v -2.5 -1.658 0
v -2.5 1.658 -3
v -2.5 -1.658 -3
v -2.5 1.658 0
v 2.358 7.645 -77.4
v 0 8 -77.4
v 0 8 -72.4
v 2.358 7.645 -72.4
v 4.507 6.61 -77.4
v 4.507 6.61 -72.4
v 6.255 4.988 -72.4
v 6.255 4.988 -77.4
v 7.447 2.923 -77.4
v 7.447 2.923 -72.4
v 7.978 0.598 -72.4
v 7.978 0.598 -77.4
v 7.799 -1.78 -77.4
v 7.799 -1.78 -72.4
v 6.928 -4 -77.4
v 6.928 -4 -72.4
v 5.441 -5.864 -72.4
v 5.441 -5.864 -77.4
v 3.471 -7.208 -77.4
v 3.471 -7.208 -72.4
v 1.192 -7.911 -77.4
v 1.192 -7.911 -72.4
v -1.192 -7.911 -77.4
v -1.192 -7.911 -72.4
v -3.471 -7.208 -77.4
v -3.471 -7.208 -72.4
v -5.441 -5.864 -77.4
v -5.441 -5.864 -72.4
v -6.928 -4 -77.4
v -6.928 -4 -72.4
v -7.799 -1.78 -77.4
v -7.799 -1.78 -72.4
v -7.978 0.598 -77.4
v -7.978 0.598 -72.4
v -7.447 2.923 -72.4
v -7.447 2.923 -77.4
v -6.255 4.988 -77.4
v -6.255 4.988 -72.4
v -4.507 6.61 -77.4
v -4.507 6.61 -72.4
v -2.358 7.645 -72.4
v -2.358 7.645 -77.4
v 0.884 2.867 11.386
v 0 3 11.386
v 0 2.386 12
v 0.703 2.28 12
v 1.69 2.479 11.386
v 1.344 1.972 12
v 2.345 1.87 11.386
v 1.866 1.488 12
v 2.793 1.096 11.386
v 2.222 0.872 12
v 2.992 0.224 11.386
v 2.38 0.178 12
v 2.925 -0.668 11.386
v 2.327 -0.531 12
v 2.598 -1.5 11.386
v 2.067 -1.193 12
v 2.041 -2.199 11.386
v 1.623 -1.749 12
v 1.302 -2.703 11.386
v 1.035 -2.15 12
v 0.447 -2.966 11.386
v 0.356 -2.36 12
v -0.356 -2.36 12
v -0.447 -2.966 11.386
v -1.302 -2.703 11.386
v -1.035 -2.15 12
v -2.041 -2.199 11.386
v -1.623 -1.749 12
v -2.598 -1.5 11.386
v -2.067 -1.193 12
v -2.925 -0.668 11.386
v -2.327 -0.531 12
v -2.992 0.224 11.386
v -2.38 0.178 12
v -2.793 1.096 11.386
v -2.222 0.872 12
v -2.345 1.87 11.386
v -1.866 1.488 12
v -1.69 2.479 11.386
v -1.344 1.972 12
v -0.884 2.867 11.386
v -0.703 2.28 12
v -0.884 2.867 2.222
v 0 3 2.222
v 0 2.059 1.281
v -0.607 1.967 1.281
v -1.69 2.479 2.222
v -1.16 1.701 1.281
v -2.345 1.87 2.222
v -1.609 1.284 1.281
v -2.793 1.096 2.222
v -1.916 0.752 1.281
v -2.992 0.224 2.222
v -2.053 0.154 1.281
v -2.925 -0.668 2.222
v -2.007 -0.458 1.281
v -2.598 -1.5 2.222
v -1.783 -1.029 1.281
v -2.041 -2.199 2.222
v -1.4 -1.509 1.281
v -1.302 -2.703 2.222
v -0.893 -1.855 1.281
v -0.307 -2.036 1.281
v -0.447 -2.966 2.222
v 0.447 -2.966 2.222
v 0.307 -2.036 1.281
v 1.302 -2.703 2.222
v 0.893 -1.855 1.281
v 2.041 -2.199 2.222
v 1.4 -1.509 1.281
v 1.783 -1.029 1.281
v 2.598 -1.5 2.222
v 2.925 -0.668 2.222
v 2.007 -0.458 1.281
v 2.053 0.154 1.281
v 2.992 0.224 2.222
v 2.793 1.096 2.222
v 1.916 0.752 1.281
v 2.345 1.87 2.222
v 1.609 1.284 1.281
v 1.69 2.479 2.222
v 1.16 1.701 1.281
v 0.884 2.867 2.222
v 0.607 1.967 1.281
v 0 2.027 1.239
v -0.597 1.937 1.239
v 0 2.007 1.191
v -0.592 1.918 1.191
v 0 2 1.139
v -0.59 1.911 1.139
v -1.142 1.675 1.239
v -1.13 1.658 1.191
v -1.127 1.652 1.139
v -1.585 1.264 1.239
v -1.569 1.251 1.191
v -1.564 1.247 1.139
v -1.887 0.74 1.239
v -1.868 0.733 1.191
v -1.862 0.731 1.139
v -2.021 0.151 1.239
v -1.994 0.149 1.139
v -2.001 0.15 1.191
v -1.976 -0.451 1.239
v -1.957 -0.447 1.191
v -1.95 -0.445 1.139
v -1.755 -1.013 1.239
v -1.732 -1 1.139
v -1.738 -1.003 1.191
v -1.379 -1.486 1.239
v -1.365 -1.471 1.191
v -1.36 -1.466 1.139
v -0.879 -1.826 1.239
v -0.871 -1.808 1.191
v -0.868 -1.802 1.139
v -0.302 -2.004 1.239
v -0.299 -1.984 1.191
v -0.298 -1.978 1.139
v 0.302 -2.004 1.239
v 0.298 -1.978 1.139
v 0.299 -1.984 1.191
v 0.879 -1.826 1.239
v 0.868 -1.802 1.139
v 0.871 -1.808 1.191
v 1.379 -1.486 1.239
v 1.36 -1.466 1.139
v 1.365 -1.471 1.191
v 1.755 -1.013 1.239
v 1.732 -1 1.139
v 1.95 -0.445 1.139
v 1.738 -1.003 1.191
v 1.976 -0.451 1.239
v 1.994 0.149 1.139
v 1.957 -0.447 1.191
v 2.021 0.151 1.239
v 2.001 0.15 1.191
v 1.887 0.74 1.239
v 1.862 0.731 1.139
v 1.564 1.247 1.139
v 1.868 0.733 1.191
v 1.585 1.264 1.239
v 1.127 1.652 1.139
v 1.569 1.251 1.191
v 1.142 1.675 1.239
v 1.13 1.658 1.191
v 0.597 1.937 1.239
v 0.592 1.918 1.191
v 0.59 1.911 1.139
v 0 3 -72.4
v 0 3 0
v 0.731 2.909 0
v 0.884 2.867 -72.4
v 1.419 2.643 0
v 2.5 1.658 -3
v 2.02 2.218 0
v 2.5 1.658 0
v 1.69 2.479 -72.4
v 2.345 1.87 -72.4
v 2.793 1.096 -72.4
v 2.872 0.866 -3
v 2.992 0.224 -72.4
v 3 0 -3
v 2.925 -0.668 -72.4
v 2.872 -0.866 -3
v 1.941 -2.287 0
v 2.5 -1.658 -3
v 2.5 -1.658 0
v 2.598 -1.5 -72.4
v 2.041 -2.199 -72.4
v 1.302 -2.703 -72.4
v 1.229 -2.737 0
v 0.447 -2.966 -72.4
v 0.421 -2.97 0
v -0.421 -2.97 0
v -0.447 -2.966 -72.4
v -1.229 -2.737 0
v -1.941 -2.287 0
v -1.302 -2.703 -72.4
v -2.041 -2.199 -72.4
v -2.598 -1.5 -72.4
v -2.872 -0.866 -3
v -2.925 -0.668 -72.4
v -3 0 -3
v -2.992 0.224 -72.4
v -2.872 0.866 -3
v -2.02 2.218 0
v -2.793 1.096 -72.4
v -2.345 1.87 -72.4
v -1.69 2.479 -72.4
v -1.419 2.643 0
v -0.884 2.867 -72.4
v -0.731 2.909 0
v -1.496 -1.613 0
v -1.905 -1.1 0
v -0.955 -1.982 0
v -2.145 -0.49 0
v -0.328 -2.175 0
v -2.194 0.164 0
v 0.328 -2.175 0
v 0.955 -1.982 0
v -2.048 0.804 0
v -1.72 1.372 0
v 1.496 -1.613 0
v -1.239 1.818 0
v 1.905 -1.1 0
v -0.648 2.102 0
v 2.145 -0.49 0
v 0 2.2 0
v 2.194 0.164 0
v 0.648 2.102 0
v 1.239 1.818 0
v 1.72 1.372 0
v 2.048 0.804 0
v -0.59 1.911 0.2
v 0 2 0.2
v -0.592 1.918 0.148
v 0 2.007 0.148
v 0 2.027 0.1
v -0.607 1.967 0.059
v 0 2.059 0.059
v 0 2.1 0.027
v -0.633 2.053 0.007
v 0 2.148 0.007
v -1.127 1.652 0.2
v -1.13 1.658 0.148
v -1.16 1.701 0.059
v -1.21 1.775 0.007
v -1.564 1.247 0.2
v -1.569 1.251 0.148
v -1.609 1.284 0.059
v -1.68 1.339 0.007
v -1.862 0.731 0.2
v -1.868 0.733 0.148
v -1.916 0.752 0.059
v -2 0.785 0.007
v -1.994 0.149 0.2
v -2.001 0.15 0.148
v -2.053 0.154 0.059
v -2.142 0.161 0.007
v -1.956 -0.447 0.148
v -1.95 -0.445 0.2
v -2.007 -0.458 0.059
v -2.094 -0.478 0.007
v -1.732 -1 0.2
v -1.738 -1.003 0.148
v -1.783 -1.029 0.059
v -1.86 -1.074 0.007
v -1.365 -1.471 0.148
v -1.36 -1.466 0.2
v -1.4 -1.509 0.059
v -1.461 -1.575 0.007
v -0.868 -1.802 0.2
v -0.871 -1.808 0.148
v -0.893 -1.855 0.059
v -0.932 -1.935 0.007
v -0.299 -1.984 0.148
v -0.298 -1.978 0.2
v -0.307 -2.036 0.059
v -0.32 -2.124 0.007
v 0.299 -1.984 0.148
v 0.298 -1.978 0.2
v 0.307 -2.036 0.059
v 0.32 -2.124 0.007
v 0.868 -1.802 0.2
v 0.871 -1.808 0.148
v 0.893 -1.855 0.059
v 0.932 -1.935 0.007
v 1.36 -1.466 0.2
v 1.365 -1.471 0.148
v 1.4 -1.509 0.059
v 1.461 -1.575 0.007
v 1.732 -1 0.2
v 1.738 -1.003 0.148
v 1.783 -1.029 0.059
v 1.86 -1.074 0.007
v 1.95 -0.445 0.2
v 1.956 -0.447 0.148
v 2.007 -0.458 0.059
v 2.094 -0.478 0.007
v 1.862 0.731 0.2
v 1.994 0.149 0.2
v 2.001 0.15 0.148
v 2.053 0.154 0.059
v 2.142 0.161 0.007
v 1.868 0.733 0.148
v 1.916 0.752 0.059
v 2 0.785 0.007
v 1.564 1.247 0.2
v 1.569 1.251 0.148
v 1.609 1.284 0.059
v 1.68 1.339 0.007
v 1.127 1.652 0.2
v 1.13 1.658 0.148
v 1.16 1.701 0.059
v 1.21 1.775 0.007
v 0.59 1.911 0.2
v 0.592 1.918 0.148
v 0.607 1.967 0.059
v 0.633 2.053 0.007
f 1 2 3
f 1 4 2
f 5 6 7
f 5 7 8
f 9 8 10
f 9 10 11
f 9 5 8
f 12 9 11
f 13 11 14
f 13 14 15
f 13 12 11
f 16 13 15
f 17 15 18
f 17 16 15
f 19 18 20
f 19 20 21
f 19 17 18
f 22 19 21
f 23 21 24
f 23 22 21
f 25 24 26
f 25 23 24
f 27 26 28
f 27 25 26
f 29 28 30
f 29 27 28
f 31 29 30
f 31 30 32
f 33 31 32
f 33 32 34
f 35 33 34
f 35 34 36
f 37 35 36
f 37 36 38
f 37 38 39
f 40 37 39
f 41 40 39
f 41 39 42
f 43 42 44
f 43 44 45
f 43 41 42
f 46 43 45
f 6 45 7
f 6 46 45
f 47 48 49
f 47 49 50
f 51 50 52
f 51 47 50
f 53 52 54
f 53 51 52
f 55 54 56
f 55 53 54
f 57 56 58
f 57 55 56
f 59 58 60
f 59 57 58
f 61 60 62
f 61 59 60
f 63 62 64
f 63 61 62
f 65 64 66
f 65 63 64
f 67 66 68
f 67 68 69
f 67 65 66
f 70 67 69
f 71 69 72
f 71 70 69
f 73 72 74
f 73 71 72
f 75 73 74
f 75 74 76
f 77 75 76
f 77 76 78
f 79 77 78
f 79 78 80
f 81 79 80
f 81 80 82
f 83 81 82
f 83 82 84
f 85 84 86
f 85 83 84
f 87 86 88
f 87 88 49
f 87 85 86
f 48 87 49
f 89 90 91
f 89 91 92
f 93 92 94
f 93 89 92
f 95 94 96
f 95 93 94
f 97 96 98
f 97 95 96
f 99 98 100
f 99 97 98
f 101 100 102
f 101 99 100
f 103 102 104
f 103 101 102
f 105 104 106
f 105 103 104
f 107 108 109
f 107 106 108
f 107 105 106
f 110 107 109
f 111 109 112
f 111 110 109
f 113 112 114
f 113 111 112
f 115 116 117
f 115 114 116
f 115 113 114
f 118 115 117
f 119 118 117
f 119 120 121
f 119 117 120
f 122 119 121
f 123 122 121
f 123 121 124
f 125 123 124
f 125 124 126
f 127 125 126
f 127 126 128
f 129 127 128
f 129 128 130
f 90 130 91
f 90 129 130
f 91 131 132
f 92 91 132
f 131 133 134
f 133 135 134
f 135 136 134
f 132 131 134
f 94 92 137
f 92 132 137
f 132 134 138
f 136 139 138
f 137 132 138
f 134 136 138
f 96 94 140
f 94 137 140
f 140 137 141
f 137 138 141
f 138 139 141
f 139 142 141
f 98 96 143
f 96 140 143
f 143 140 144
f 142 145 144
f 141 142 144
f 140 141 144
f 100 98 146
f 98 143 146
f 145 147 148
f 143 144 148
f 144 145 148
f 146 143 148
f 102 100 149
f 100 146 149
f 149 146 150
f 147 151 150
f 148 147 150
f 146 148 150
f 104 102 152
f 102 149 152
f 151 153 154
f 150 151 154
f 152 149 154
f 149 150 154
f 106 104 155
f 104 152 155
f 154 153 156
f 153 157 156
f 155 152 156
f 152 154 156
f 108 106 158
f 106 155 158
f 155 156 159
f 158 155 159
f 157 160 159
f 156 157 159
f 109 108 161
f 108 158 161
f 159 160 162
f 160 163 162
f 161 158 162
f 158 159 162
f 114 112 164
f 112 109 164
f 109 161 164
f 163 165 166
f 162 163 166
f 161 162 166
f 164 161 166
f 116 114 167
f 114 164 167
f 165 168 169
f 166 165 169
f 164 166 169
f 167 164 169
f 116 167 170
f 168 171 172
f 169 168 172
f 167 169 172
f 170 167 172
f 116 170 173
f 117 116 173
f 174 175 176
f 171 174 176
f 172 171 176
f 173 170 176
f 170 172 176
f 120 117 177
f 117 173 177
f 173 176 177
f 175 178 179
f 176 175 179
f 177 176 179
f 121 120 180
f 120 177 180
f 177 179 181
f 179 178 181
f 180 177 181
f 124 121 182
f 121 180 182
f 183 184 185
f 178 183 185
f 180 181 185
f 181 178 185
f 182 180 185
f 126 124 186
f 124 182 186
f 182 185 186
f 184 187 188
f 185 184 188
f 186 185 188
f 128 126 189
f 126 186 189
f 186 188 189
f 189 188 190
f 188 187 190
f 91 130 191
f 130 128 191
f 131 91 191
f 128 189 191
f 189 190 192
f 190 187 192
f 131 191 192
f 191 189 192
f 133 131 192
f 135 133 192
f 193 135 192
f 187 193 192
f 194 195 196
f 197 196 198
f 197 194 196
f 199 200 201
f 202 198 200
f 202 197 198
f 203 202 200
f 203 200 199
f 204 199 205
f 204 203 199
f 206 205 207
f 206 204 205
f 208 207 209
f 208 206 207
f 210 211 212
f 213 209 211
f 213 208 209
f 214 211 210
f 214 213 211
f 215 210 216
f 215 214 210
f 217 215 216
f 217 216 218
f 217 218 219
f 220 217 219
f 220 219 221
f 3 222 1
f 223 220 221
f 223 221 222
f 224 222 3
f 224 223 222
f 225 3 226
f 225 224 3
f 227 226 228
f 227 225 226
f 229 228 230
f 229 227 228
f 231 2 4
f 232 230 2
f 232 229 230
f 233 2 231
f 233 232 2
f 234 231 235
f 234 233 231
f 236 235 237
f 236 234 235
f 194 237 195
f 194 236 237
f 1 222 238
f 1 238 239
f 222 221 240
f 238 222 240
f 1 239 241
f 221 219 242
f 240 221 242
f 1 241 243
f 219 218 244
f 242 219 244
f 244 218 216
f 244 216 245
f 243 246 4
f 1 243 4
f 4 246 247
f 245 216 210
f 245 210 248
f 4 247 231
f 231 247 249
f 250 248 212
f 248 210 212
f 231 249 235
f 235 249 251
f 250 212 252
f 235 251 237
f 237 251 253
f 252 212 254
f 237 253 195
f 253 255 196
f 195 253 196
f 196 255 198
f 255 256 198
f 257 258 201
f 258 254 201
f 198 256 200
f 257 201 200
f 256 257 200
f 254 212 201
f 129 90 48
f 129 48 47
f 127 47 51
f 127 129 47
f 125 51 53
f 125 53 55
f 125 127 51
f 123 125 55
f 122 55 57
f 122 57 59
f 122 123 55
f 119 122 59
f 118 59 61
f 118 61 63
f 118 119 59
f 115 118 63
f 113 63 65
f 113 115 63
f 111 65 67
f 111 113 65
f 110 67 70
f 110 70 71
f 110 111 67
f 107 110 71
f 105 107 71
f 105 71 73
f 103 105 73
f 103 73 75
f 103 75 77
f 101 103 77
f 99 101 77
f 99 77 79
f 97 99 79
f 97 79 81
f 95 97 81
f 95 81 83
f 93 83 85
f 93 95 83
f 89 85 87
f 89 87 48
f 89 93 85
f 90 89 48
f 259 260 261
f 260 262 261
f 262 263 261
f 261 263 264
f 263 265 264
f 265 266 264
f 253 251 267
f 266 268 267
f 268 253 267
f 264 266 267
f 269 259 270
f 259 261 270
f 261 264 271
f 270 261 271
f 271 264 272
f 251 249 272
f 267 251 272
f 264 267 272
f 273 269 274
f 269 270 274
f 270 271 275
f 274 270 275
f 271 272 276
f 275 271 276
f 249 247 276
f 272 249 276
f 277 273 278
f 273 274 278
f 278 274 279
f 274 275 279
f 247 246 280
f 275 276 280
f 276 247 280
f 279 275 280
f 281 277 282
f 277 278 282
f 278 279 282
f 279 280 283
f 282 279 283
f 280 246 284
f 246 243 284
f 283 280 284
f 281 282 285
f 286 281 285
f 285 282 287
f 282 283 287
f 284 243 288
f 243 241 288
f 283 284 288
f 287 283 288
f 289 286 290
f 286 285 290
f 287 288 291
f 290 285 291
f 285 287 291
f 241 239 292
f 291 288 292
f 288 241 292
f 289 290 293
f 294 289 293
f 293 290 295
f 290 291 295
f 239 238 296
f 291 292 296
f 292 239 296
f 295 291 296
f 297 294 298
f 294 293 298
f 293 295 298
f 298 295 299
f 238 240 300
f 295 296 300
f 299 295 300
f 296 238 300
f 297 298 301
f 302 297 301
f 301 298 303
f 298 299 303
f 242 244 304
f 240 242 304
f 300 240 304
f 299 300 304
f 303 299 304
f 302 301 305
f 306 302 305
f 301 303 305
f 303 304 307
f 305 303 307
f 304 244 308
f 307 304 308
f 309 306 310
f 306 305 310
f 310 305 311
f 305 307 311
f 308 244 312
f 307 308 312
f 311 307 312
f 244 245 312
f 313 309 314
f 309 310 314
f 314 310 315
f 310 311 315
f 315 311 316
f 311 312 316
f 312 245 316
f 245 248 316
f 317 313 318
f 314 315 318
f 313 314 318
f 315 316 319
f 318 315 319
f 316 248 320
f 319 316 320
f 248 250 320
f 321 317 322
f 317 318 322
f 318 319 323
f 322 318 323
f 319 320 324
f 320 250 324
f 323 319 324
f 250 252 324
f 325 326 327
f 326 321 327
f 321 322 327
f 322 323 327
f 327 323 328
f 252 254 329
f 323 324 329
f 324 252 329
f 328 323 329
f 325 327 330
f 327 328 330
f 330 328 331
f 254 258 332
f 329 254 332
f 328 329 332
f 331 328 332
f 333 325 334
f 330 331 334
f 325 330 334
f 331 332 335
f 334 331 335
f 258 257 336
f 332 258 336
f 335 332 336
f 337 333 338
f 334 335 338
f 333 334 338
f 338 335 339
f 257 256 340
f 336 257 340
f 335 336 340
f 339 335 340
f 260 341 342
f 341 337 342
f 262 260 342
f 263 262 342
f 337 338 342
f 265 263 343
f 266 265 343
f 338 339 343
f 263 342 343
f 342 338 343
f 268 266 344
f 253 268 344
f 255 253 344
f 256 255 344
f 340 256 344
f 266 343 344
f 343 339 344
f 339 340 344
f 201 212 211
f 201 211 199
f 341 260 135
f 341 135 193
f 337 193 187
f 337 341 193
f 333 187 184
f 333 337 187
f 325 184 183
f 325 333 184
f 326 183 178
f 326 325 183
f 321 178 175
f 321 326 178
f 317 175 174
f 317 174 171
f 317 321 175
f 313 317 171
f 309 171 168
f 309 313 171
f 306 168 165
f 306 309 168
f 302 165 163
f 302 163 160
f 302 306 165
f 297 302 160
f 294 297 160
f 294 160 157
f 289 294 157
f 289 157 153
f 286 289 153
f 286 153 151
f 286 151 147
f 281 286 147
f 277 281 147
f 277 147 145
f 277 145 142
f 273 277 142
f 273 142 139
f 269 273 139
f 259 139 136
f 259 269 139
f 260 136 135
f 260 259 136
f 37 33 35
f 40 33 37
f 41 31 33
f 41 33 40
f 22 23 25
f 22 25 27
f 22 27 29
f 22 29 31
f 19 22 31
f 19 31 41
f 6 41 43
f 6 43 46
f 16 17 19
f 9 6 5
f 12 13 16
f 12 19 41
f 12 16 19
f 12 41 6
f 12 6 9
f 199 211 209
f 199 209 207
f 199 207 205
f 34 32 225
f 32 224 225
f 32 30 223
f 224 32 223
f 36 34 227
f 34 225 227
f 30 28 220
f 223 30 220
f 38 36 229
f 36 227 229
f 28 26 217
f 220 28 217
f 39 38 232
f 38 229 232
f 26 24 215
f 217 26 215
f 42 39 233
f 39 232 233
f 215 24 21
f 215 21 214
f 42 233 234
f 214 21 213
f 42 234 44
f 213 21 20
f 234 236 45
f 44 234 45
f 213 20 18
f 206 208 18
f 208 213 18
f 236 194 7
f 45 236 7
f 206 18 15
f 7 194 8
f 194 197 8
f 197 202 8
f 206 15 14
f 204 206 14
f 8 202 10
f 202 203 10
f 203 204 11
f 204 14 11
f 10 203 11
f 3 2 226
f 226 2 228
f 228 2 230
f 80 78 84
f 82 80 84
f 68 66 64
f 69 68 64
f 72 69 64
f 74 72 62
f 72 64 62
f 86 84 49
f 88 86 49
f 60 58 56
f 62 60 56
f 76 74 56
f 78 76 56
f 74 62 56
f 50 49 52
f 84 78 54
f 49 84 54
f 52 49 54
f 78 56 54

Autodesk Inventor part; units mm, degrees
sketch "Sketch_1" plane through (0, 0, 0) normal (1, 0, 0) x (0, 1, 0)
  line L0 (0, -77.4) -> (0, 0)
  line L1 (0, 0) -> (3, 0)
  line L2 (3, 0) -> (3, -72.4)
  line L3 (3, -72.4) -> (8, -72.4)
  line L4 (8, -72.4) -> (8, -77.4)
  line L5 (8, -77.4) -> (0, -77.4)
  line L6 (0, -77.4) -> (0, 0)
revolve "Revolution1" add sketch "Sketch_1" angle 360 about axis through (0, 0, -77.4) along (0, 0, -1)
sketch "Sketch_2" plane through (0, 0, 0) normal (1, 0, 0) x (0, 1, 0)
  line L0 (0, 0) -> (0, 12)
  line L1 (0, 12) -> (2.3865, 12)
  line L2 (2.3865, 12) -> (3, 11.3865)
  line L3 (3, 11.3865) -> (3, 2.2222)
  line L4 (3, 2.2222) -> (2.0586, 1.2808)
  arc A0 (2.0586, 1.2808) -> (2, 1.1394) centre (2.2, 1.1394) ccw
  line L5 (2, 1.1394) -> (2, 0.2)
  arc A1 (2, 0.2) -> (2.2, 0) centre (2.2, 0.2) ccw
  line L6 (2.2, 0) -> (0, 0)
  line L7 (0, 0) -> (0, 12)
revolve "Revolution2" add sketch "Sketch_2" angle 360 about axis through (0, 0, 0) along (0, 0, -1)
thread "Thread1" size "M6x1" class "6g" standard "ISO Metric profile" full length
sketch "Sketch_8" plane through (0, 0, 0) normal (0, 0, 1) x (1, 0, 0)
  line L0 (-4.5, 5) -> (-4.5, -5)
  line L1 (-4.5, -5) -> (4.5, -5)
  line L2 (4.5, -5) -> (4.5, 5)
  line L3 (4.5, 5) -> (-4.5, 5)
  line L4 (-2.5, -4) -> (2.5, -4)
  line L5 (2.5, -4) -> (2.5, 4)
  line L6 (2.5, 4) -> (-2.5, 4)
  line L7 (-2.5, 4) -> (-2.5, -4)
extrude "Extrusion1" cut sketch "Sketch_8" against normal blind 3
ref_plane "CP1_XY" through (0, 0, -77.4) normal (0, 0, -1) x (1, 0, 0)
ref_plane "CP1_YZ" through (0, 0, -77.4) normal (1, 0, 0) x (0, -1, 0)
ref_plane "CP1_ZX" through (0, 0, -77.4) normal (0, -1, 0) x (0, 0, -1)
ref_plane "CP_P_XY" through (0, 0, -77.4) normal (0, 0, 1) x (1, 0, 0)
ref_plane "CP_P_YZ" through (0, 0, -77.4) normal (1, 0, 0) x (0, 1, 0)
ref_plane "CP_P_ZX" through (0, 0, -77.4) normal (0, 1, 0) x (0, 0, 1)
ref_plane "CP_PL_XY" through (0, 0, -3) normal (0, 0, 1) x (1, 0, 0)
ref_plane "CP_PL_YZ" through (0, 0, -3) normal (1, 0, 0) x (0, 1, 0)
ref_plane "CP_PL_ZX" through (0, 0, -3) normal (0, 1, 0) x (0, 0, 1)
ref_plane "DIM_ZM_XY" through (0, 3, -150) normal (1, 0, 0) x (0, 0, -1)
ref_plane "DIM_ZM_YZ" through (0, 3, -150) normal (0, 0, -1) x (0, 1, 0)
ref_plane "DIM_ZM_ZX" through (0, 3, -150) normal (0, 1, 0) x (1, 0, 0)
ref_plane "DISC_XY" through (0, 0, 5) normal (0, 0, -1) x (1, 0, 0)
ref_plane "DISC_YZ" through (0, 0, 5) normal (1, 0, 0) x (0, -1, 0)
ref_plane "DISC_ZX" through (0, 0, 5) normal (0, -1, 0) x (0, 0, -1)
ref_plane "NUT_6_10_T_1_XY" through (0, 0, -161) normal (0, 0, 1) x (1, 0, 0)
ref_plane "NUT_6_10_T_1_YZ" through (0, 0, -161) normal (1, 0, 0) x (0, 1, 0)
ref_plane "NUT_6_10_T_1_ZX" through (0, 0, -161) normal (0, 1, 0) x (0, 0, 1)
ref_plane "NUT_6_10_T_2_XY" through (0, 0, -158.8) normal (0, 0, 1) x (1, 0, 0)
ref_plane "NUT_6_10_T_2_YZ" through (0, 0, -158.8) normal (1, 0, 0) x (0, 1, 0)
ref_plane "NUT_6_10_T_2_ZX" through (0, 0, -158.8) normal (0, 1, 0) x (0, 0, 1)
ref_plane "NUT_CP_6_10_1_XY" through (0, 0, 10) normal (0, 0, 1) x (1, 0, 0)
ref_plane "NUT_CP_6_10_1_YZ" through (0, 0, 10) normal (1, 0, 0) x (0, 1, 0)
ref_plane "NUT_CP_6_10_1_ZX" through (0, 0, 10) normal (0, 1, 0) x (0, 0, 1)
ref_plane "NUT_CP_6_10_2_XY" through (0, 0, 7.8) normal (0, 0, 1) x (1, 0, 0)
ref_plane "NUT_CP_6_10_2_YZ" through (0, 0, 7.8) normal (1, 0, 0) x (0, 1, 0)
ref_plane "NUT_CP_6_10_2_ZX" through (0, 0, 7.8) normal (0, 1, 0) x (0, 0, 1)
properties part number "4186566 DPDM-50---(r)" material "Stainless Steel"
